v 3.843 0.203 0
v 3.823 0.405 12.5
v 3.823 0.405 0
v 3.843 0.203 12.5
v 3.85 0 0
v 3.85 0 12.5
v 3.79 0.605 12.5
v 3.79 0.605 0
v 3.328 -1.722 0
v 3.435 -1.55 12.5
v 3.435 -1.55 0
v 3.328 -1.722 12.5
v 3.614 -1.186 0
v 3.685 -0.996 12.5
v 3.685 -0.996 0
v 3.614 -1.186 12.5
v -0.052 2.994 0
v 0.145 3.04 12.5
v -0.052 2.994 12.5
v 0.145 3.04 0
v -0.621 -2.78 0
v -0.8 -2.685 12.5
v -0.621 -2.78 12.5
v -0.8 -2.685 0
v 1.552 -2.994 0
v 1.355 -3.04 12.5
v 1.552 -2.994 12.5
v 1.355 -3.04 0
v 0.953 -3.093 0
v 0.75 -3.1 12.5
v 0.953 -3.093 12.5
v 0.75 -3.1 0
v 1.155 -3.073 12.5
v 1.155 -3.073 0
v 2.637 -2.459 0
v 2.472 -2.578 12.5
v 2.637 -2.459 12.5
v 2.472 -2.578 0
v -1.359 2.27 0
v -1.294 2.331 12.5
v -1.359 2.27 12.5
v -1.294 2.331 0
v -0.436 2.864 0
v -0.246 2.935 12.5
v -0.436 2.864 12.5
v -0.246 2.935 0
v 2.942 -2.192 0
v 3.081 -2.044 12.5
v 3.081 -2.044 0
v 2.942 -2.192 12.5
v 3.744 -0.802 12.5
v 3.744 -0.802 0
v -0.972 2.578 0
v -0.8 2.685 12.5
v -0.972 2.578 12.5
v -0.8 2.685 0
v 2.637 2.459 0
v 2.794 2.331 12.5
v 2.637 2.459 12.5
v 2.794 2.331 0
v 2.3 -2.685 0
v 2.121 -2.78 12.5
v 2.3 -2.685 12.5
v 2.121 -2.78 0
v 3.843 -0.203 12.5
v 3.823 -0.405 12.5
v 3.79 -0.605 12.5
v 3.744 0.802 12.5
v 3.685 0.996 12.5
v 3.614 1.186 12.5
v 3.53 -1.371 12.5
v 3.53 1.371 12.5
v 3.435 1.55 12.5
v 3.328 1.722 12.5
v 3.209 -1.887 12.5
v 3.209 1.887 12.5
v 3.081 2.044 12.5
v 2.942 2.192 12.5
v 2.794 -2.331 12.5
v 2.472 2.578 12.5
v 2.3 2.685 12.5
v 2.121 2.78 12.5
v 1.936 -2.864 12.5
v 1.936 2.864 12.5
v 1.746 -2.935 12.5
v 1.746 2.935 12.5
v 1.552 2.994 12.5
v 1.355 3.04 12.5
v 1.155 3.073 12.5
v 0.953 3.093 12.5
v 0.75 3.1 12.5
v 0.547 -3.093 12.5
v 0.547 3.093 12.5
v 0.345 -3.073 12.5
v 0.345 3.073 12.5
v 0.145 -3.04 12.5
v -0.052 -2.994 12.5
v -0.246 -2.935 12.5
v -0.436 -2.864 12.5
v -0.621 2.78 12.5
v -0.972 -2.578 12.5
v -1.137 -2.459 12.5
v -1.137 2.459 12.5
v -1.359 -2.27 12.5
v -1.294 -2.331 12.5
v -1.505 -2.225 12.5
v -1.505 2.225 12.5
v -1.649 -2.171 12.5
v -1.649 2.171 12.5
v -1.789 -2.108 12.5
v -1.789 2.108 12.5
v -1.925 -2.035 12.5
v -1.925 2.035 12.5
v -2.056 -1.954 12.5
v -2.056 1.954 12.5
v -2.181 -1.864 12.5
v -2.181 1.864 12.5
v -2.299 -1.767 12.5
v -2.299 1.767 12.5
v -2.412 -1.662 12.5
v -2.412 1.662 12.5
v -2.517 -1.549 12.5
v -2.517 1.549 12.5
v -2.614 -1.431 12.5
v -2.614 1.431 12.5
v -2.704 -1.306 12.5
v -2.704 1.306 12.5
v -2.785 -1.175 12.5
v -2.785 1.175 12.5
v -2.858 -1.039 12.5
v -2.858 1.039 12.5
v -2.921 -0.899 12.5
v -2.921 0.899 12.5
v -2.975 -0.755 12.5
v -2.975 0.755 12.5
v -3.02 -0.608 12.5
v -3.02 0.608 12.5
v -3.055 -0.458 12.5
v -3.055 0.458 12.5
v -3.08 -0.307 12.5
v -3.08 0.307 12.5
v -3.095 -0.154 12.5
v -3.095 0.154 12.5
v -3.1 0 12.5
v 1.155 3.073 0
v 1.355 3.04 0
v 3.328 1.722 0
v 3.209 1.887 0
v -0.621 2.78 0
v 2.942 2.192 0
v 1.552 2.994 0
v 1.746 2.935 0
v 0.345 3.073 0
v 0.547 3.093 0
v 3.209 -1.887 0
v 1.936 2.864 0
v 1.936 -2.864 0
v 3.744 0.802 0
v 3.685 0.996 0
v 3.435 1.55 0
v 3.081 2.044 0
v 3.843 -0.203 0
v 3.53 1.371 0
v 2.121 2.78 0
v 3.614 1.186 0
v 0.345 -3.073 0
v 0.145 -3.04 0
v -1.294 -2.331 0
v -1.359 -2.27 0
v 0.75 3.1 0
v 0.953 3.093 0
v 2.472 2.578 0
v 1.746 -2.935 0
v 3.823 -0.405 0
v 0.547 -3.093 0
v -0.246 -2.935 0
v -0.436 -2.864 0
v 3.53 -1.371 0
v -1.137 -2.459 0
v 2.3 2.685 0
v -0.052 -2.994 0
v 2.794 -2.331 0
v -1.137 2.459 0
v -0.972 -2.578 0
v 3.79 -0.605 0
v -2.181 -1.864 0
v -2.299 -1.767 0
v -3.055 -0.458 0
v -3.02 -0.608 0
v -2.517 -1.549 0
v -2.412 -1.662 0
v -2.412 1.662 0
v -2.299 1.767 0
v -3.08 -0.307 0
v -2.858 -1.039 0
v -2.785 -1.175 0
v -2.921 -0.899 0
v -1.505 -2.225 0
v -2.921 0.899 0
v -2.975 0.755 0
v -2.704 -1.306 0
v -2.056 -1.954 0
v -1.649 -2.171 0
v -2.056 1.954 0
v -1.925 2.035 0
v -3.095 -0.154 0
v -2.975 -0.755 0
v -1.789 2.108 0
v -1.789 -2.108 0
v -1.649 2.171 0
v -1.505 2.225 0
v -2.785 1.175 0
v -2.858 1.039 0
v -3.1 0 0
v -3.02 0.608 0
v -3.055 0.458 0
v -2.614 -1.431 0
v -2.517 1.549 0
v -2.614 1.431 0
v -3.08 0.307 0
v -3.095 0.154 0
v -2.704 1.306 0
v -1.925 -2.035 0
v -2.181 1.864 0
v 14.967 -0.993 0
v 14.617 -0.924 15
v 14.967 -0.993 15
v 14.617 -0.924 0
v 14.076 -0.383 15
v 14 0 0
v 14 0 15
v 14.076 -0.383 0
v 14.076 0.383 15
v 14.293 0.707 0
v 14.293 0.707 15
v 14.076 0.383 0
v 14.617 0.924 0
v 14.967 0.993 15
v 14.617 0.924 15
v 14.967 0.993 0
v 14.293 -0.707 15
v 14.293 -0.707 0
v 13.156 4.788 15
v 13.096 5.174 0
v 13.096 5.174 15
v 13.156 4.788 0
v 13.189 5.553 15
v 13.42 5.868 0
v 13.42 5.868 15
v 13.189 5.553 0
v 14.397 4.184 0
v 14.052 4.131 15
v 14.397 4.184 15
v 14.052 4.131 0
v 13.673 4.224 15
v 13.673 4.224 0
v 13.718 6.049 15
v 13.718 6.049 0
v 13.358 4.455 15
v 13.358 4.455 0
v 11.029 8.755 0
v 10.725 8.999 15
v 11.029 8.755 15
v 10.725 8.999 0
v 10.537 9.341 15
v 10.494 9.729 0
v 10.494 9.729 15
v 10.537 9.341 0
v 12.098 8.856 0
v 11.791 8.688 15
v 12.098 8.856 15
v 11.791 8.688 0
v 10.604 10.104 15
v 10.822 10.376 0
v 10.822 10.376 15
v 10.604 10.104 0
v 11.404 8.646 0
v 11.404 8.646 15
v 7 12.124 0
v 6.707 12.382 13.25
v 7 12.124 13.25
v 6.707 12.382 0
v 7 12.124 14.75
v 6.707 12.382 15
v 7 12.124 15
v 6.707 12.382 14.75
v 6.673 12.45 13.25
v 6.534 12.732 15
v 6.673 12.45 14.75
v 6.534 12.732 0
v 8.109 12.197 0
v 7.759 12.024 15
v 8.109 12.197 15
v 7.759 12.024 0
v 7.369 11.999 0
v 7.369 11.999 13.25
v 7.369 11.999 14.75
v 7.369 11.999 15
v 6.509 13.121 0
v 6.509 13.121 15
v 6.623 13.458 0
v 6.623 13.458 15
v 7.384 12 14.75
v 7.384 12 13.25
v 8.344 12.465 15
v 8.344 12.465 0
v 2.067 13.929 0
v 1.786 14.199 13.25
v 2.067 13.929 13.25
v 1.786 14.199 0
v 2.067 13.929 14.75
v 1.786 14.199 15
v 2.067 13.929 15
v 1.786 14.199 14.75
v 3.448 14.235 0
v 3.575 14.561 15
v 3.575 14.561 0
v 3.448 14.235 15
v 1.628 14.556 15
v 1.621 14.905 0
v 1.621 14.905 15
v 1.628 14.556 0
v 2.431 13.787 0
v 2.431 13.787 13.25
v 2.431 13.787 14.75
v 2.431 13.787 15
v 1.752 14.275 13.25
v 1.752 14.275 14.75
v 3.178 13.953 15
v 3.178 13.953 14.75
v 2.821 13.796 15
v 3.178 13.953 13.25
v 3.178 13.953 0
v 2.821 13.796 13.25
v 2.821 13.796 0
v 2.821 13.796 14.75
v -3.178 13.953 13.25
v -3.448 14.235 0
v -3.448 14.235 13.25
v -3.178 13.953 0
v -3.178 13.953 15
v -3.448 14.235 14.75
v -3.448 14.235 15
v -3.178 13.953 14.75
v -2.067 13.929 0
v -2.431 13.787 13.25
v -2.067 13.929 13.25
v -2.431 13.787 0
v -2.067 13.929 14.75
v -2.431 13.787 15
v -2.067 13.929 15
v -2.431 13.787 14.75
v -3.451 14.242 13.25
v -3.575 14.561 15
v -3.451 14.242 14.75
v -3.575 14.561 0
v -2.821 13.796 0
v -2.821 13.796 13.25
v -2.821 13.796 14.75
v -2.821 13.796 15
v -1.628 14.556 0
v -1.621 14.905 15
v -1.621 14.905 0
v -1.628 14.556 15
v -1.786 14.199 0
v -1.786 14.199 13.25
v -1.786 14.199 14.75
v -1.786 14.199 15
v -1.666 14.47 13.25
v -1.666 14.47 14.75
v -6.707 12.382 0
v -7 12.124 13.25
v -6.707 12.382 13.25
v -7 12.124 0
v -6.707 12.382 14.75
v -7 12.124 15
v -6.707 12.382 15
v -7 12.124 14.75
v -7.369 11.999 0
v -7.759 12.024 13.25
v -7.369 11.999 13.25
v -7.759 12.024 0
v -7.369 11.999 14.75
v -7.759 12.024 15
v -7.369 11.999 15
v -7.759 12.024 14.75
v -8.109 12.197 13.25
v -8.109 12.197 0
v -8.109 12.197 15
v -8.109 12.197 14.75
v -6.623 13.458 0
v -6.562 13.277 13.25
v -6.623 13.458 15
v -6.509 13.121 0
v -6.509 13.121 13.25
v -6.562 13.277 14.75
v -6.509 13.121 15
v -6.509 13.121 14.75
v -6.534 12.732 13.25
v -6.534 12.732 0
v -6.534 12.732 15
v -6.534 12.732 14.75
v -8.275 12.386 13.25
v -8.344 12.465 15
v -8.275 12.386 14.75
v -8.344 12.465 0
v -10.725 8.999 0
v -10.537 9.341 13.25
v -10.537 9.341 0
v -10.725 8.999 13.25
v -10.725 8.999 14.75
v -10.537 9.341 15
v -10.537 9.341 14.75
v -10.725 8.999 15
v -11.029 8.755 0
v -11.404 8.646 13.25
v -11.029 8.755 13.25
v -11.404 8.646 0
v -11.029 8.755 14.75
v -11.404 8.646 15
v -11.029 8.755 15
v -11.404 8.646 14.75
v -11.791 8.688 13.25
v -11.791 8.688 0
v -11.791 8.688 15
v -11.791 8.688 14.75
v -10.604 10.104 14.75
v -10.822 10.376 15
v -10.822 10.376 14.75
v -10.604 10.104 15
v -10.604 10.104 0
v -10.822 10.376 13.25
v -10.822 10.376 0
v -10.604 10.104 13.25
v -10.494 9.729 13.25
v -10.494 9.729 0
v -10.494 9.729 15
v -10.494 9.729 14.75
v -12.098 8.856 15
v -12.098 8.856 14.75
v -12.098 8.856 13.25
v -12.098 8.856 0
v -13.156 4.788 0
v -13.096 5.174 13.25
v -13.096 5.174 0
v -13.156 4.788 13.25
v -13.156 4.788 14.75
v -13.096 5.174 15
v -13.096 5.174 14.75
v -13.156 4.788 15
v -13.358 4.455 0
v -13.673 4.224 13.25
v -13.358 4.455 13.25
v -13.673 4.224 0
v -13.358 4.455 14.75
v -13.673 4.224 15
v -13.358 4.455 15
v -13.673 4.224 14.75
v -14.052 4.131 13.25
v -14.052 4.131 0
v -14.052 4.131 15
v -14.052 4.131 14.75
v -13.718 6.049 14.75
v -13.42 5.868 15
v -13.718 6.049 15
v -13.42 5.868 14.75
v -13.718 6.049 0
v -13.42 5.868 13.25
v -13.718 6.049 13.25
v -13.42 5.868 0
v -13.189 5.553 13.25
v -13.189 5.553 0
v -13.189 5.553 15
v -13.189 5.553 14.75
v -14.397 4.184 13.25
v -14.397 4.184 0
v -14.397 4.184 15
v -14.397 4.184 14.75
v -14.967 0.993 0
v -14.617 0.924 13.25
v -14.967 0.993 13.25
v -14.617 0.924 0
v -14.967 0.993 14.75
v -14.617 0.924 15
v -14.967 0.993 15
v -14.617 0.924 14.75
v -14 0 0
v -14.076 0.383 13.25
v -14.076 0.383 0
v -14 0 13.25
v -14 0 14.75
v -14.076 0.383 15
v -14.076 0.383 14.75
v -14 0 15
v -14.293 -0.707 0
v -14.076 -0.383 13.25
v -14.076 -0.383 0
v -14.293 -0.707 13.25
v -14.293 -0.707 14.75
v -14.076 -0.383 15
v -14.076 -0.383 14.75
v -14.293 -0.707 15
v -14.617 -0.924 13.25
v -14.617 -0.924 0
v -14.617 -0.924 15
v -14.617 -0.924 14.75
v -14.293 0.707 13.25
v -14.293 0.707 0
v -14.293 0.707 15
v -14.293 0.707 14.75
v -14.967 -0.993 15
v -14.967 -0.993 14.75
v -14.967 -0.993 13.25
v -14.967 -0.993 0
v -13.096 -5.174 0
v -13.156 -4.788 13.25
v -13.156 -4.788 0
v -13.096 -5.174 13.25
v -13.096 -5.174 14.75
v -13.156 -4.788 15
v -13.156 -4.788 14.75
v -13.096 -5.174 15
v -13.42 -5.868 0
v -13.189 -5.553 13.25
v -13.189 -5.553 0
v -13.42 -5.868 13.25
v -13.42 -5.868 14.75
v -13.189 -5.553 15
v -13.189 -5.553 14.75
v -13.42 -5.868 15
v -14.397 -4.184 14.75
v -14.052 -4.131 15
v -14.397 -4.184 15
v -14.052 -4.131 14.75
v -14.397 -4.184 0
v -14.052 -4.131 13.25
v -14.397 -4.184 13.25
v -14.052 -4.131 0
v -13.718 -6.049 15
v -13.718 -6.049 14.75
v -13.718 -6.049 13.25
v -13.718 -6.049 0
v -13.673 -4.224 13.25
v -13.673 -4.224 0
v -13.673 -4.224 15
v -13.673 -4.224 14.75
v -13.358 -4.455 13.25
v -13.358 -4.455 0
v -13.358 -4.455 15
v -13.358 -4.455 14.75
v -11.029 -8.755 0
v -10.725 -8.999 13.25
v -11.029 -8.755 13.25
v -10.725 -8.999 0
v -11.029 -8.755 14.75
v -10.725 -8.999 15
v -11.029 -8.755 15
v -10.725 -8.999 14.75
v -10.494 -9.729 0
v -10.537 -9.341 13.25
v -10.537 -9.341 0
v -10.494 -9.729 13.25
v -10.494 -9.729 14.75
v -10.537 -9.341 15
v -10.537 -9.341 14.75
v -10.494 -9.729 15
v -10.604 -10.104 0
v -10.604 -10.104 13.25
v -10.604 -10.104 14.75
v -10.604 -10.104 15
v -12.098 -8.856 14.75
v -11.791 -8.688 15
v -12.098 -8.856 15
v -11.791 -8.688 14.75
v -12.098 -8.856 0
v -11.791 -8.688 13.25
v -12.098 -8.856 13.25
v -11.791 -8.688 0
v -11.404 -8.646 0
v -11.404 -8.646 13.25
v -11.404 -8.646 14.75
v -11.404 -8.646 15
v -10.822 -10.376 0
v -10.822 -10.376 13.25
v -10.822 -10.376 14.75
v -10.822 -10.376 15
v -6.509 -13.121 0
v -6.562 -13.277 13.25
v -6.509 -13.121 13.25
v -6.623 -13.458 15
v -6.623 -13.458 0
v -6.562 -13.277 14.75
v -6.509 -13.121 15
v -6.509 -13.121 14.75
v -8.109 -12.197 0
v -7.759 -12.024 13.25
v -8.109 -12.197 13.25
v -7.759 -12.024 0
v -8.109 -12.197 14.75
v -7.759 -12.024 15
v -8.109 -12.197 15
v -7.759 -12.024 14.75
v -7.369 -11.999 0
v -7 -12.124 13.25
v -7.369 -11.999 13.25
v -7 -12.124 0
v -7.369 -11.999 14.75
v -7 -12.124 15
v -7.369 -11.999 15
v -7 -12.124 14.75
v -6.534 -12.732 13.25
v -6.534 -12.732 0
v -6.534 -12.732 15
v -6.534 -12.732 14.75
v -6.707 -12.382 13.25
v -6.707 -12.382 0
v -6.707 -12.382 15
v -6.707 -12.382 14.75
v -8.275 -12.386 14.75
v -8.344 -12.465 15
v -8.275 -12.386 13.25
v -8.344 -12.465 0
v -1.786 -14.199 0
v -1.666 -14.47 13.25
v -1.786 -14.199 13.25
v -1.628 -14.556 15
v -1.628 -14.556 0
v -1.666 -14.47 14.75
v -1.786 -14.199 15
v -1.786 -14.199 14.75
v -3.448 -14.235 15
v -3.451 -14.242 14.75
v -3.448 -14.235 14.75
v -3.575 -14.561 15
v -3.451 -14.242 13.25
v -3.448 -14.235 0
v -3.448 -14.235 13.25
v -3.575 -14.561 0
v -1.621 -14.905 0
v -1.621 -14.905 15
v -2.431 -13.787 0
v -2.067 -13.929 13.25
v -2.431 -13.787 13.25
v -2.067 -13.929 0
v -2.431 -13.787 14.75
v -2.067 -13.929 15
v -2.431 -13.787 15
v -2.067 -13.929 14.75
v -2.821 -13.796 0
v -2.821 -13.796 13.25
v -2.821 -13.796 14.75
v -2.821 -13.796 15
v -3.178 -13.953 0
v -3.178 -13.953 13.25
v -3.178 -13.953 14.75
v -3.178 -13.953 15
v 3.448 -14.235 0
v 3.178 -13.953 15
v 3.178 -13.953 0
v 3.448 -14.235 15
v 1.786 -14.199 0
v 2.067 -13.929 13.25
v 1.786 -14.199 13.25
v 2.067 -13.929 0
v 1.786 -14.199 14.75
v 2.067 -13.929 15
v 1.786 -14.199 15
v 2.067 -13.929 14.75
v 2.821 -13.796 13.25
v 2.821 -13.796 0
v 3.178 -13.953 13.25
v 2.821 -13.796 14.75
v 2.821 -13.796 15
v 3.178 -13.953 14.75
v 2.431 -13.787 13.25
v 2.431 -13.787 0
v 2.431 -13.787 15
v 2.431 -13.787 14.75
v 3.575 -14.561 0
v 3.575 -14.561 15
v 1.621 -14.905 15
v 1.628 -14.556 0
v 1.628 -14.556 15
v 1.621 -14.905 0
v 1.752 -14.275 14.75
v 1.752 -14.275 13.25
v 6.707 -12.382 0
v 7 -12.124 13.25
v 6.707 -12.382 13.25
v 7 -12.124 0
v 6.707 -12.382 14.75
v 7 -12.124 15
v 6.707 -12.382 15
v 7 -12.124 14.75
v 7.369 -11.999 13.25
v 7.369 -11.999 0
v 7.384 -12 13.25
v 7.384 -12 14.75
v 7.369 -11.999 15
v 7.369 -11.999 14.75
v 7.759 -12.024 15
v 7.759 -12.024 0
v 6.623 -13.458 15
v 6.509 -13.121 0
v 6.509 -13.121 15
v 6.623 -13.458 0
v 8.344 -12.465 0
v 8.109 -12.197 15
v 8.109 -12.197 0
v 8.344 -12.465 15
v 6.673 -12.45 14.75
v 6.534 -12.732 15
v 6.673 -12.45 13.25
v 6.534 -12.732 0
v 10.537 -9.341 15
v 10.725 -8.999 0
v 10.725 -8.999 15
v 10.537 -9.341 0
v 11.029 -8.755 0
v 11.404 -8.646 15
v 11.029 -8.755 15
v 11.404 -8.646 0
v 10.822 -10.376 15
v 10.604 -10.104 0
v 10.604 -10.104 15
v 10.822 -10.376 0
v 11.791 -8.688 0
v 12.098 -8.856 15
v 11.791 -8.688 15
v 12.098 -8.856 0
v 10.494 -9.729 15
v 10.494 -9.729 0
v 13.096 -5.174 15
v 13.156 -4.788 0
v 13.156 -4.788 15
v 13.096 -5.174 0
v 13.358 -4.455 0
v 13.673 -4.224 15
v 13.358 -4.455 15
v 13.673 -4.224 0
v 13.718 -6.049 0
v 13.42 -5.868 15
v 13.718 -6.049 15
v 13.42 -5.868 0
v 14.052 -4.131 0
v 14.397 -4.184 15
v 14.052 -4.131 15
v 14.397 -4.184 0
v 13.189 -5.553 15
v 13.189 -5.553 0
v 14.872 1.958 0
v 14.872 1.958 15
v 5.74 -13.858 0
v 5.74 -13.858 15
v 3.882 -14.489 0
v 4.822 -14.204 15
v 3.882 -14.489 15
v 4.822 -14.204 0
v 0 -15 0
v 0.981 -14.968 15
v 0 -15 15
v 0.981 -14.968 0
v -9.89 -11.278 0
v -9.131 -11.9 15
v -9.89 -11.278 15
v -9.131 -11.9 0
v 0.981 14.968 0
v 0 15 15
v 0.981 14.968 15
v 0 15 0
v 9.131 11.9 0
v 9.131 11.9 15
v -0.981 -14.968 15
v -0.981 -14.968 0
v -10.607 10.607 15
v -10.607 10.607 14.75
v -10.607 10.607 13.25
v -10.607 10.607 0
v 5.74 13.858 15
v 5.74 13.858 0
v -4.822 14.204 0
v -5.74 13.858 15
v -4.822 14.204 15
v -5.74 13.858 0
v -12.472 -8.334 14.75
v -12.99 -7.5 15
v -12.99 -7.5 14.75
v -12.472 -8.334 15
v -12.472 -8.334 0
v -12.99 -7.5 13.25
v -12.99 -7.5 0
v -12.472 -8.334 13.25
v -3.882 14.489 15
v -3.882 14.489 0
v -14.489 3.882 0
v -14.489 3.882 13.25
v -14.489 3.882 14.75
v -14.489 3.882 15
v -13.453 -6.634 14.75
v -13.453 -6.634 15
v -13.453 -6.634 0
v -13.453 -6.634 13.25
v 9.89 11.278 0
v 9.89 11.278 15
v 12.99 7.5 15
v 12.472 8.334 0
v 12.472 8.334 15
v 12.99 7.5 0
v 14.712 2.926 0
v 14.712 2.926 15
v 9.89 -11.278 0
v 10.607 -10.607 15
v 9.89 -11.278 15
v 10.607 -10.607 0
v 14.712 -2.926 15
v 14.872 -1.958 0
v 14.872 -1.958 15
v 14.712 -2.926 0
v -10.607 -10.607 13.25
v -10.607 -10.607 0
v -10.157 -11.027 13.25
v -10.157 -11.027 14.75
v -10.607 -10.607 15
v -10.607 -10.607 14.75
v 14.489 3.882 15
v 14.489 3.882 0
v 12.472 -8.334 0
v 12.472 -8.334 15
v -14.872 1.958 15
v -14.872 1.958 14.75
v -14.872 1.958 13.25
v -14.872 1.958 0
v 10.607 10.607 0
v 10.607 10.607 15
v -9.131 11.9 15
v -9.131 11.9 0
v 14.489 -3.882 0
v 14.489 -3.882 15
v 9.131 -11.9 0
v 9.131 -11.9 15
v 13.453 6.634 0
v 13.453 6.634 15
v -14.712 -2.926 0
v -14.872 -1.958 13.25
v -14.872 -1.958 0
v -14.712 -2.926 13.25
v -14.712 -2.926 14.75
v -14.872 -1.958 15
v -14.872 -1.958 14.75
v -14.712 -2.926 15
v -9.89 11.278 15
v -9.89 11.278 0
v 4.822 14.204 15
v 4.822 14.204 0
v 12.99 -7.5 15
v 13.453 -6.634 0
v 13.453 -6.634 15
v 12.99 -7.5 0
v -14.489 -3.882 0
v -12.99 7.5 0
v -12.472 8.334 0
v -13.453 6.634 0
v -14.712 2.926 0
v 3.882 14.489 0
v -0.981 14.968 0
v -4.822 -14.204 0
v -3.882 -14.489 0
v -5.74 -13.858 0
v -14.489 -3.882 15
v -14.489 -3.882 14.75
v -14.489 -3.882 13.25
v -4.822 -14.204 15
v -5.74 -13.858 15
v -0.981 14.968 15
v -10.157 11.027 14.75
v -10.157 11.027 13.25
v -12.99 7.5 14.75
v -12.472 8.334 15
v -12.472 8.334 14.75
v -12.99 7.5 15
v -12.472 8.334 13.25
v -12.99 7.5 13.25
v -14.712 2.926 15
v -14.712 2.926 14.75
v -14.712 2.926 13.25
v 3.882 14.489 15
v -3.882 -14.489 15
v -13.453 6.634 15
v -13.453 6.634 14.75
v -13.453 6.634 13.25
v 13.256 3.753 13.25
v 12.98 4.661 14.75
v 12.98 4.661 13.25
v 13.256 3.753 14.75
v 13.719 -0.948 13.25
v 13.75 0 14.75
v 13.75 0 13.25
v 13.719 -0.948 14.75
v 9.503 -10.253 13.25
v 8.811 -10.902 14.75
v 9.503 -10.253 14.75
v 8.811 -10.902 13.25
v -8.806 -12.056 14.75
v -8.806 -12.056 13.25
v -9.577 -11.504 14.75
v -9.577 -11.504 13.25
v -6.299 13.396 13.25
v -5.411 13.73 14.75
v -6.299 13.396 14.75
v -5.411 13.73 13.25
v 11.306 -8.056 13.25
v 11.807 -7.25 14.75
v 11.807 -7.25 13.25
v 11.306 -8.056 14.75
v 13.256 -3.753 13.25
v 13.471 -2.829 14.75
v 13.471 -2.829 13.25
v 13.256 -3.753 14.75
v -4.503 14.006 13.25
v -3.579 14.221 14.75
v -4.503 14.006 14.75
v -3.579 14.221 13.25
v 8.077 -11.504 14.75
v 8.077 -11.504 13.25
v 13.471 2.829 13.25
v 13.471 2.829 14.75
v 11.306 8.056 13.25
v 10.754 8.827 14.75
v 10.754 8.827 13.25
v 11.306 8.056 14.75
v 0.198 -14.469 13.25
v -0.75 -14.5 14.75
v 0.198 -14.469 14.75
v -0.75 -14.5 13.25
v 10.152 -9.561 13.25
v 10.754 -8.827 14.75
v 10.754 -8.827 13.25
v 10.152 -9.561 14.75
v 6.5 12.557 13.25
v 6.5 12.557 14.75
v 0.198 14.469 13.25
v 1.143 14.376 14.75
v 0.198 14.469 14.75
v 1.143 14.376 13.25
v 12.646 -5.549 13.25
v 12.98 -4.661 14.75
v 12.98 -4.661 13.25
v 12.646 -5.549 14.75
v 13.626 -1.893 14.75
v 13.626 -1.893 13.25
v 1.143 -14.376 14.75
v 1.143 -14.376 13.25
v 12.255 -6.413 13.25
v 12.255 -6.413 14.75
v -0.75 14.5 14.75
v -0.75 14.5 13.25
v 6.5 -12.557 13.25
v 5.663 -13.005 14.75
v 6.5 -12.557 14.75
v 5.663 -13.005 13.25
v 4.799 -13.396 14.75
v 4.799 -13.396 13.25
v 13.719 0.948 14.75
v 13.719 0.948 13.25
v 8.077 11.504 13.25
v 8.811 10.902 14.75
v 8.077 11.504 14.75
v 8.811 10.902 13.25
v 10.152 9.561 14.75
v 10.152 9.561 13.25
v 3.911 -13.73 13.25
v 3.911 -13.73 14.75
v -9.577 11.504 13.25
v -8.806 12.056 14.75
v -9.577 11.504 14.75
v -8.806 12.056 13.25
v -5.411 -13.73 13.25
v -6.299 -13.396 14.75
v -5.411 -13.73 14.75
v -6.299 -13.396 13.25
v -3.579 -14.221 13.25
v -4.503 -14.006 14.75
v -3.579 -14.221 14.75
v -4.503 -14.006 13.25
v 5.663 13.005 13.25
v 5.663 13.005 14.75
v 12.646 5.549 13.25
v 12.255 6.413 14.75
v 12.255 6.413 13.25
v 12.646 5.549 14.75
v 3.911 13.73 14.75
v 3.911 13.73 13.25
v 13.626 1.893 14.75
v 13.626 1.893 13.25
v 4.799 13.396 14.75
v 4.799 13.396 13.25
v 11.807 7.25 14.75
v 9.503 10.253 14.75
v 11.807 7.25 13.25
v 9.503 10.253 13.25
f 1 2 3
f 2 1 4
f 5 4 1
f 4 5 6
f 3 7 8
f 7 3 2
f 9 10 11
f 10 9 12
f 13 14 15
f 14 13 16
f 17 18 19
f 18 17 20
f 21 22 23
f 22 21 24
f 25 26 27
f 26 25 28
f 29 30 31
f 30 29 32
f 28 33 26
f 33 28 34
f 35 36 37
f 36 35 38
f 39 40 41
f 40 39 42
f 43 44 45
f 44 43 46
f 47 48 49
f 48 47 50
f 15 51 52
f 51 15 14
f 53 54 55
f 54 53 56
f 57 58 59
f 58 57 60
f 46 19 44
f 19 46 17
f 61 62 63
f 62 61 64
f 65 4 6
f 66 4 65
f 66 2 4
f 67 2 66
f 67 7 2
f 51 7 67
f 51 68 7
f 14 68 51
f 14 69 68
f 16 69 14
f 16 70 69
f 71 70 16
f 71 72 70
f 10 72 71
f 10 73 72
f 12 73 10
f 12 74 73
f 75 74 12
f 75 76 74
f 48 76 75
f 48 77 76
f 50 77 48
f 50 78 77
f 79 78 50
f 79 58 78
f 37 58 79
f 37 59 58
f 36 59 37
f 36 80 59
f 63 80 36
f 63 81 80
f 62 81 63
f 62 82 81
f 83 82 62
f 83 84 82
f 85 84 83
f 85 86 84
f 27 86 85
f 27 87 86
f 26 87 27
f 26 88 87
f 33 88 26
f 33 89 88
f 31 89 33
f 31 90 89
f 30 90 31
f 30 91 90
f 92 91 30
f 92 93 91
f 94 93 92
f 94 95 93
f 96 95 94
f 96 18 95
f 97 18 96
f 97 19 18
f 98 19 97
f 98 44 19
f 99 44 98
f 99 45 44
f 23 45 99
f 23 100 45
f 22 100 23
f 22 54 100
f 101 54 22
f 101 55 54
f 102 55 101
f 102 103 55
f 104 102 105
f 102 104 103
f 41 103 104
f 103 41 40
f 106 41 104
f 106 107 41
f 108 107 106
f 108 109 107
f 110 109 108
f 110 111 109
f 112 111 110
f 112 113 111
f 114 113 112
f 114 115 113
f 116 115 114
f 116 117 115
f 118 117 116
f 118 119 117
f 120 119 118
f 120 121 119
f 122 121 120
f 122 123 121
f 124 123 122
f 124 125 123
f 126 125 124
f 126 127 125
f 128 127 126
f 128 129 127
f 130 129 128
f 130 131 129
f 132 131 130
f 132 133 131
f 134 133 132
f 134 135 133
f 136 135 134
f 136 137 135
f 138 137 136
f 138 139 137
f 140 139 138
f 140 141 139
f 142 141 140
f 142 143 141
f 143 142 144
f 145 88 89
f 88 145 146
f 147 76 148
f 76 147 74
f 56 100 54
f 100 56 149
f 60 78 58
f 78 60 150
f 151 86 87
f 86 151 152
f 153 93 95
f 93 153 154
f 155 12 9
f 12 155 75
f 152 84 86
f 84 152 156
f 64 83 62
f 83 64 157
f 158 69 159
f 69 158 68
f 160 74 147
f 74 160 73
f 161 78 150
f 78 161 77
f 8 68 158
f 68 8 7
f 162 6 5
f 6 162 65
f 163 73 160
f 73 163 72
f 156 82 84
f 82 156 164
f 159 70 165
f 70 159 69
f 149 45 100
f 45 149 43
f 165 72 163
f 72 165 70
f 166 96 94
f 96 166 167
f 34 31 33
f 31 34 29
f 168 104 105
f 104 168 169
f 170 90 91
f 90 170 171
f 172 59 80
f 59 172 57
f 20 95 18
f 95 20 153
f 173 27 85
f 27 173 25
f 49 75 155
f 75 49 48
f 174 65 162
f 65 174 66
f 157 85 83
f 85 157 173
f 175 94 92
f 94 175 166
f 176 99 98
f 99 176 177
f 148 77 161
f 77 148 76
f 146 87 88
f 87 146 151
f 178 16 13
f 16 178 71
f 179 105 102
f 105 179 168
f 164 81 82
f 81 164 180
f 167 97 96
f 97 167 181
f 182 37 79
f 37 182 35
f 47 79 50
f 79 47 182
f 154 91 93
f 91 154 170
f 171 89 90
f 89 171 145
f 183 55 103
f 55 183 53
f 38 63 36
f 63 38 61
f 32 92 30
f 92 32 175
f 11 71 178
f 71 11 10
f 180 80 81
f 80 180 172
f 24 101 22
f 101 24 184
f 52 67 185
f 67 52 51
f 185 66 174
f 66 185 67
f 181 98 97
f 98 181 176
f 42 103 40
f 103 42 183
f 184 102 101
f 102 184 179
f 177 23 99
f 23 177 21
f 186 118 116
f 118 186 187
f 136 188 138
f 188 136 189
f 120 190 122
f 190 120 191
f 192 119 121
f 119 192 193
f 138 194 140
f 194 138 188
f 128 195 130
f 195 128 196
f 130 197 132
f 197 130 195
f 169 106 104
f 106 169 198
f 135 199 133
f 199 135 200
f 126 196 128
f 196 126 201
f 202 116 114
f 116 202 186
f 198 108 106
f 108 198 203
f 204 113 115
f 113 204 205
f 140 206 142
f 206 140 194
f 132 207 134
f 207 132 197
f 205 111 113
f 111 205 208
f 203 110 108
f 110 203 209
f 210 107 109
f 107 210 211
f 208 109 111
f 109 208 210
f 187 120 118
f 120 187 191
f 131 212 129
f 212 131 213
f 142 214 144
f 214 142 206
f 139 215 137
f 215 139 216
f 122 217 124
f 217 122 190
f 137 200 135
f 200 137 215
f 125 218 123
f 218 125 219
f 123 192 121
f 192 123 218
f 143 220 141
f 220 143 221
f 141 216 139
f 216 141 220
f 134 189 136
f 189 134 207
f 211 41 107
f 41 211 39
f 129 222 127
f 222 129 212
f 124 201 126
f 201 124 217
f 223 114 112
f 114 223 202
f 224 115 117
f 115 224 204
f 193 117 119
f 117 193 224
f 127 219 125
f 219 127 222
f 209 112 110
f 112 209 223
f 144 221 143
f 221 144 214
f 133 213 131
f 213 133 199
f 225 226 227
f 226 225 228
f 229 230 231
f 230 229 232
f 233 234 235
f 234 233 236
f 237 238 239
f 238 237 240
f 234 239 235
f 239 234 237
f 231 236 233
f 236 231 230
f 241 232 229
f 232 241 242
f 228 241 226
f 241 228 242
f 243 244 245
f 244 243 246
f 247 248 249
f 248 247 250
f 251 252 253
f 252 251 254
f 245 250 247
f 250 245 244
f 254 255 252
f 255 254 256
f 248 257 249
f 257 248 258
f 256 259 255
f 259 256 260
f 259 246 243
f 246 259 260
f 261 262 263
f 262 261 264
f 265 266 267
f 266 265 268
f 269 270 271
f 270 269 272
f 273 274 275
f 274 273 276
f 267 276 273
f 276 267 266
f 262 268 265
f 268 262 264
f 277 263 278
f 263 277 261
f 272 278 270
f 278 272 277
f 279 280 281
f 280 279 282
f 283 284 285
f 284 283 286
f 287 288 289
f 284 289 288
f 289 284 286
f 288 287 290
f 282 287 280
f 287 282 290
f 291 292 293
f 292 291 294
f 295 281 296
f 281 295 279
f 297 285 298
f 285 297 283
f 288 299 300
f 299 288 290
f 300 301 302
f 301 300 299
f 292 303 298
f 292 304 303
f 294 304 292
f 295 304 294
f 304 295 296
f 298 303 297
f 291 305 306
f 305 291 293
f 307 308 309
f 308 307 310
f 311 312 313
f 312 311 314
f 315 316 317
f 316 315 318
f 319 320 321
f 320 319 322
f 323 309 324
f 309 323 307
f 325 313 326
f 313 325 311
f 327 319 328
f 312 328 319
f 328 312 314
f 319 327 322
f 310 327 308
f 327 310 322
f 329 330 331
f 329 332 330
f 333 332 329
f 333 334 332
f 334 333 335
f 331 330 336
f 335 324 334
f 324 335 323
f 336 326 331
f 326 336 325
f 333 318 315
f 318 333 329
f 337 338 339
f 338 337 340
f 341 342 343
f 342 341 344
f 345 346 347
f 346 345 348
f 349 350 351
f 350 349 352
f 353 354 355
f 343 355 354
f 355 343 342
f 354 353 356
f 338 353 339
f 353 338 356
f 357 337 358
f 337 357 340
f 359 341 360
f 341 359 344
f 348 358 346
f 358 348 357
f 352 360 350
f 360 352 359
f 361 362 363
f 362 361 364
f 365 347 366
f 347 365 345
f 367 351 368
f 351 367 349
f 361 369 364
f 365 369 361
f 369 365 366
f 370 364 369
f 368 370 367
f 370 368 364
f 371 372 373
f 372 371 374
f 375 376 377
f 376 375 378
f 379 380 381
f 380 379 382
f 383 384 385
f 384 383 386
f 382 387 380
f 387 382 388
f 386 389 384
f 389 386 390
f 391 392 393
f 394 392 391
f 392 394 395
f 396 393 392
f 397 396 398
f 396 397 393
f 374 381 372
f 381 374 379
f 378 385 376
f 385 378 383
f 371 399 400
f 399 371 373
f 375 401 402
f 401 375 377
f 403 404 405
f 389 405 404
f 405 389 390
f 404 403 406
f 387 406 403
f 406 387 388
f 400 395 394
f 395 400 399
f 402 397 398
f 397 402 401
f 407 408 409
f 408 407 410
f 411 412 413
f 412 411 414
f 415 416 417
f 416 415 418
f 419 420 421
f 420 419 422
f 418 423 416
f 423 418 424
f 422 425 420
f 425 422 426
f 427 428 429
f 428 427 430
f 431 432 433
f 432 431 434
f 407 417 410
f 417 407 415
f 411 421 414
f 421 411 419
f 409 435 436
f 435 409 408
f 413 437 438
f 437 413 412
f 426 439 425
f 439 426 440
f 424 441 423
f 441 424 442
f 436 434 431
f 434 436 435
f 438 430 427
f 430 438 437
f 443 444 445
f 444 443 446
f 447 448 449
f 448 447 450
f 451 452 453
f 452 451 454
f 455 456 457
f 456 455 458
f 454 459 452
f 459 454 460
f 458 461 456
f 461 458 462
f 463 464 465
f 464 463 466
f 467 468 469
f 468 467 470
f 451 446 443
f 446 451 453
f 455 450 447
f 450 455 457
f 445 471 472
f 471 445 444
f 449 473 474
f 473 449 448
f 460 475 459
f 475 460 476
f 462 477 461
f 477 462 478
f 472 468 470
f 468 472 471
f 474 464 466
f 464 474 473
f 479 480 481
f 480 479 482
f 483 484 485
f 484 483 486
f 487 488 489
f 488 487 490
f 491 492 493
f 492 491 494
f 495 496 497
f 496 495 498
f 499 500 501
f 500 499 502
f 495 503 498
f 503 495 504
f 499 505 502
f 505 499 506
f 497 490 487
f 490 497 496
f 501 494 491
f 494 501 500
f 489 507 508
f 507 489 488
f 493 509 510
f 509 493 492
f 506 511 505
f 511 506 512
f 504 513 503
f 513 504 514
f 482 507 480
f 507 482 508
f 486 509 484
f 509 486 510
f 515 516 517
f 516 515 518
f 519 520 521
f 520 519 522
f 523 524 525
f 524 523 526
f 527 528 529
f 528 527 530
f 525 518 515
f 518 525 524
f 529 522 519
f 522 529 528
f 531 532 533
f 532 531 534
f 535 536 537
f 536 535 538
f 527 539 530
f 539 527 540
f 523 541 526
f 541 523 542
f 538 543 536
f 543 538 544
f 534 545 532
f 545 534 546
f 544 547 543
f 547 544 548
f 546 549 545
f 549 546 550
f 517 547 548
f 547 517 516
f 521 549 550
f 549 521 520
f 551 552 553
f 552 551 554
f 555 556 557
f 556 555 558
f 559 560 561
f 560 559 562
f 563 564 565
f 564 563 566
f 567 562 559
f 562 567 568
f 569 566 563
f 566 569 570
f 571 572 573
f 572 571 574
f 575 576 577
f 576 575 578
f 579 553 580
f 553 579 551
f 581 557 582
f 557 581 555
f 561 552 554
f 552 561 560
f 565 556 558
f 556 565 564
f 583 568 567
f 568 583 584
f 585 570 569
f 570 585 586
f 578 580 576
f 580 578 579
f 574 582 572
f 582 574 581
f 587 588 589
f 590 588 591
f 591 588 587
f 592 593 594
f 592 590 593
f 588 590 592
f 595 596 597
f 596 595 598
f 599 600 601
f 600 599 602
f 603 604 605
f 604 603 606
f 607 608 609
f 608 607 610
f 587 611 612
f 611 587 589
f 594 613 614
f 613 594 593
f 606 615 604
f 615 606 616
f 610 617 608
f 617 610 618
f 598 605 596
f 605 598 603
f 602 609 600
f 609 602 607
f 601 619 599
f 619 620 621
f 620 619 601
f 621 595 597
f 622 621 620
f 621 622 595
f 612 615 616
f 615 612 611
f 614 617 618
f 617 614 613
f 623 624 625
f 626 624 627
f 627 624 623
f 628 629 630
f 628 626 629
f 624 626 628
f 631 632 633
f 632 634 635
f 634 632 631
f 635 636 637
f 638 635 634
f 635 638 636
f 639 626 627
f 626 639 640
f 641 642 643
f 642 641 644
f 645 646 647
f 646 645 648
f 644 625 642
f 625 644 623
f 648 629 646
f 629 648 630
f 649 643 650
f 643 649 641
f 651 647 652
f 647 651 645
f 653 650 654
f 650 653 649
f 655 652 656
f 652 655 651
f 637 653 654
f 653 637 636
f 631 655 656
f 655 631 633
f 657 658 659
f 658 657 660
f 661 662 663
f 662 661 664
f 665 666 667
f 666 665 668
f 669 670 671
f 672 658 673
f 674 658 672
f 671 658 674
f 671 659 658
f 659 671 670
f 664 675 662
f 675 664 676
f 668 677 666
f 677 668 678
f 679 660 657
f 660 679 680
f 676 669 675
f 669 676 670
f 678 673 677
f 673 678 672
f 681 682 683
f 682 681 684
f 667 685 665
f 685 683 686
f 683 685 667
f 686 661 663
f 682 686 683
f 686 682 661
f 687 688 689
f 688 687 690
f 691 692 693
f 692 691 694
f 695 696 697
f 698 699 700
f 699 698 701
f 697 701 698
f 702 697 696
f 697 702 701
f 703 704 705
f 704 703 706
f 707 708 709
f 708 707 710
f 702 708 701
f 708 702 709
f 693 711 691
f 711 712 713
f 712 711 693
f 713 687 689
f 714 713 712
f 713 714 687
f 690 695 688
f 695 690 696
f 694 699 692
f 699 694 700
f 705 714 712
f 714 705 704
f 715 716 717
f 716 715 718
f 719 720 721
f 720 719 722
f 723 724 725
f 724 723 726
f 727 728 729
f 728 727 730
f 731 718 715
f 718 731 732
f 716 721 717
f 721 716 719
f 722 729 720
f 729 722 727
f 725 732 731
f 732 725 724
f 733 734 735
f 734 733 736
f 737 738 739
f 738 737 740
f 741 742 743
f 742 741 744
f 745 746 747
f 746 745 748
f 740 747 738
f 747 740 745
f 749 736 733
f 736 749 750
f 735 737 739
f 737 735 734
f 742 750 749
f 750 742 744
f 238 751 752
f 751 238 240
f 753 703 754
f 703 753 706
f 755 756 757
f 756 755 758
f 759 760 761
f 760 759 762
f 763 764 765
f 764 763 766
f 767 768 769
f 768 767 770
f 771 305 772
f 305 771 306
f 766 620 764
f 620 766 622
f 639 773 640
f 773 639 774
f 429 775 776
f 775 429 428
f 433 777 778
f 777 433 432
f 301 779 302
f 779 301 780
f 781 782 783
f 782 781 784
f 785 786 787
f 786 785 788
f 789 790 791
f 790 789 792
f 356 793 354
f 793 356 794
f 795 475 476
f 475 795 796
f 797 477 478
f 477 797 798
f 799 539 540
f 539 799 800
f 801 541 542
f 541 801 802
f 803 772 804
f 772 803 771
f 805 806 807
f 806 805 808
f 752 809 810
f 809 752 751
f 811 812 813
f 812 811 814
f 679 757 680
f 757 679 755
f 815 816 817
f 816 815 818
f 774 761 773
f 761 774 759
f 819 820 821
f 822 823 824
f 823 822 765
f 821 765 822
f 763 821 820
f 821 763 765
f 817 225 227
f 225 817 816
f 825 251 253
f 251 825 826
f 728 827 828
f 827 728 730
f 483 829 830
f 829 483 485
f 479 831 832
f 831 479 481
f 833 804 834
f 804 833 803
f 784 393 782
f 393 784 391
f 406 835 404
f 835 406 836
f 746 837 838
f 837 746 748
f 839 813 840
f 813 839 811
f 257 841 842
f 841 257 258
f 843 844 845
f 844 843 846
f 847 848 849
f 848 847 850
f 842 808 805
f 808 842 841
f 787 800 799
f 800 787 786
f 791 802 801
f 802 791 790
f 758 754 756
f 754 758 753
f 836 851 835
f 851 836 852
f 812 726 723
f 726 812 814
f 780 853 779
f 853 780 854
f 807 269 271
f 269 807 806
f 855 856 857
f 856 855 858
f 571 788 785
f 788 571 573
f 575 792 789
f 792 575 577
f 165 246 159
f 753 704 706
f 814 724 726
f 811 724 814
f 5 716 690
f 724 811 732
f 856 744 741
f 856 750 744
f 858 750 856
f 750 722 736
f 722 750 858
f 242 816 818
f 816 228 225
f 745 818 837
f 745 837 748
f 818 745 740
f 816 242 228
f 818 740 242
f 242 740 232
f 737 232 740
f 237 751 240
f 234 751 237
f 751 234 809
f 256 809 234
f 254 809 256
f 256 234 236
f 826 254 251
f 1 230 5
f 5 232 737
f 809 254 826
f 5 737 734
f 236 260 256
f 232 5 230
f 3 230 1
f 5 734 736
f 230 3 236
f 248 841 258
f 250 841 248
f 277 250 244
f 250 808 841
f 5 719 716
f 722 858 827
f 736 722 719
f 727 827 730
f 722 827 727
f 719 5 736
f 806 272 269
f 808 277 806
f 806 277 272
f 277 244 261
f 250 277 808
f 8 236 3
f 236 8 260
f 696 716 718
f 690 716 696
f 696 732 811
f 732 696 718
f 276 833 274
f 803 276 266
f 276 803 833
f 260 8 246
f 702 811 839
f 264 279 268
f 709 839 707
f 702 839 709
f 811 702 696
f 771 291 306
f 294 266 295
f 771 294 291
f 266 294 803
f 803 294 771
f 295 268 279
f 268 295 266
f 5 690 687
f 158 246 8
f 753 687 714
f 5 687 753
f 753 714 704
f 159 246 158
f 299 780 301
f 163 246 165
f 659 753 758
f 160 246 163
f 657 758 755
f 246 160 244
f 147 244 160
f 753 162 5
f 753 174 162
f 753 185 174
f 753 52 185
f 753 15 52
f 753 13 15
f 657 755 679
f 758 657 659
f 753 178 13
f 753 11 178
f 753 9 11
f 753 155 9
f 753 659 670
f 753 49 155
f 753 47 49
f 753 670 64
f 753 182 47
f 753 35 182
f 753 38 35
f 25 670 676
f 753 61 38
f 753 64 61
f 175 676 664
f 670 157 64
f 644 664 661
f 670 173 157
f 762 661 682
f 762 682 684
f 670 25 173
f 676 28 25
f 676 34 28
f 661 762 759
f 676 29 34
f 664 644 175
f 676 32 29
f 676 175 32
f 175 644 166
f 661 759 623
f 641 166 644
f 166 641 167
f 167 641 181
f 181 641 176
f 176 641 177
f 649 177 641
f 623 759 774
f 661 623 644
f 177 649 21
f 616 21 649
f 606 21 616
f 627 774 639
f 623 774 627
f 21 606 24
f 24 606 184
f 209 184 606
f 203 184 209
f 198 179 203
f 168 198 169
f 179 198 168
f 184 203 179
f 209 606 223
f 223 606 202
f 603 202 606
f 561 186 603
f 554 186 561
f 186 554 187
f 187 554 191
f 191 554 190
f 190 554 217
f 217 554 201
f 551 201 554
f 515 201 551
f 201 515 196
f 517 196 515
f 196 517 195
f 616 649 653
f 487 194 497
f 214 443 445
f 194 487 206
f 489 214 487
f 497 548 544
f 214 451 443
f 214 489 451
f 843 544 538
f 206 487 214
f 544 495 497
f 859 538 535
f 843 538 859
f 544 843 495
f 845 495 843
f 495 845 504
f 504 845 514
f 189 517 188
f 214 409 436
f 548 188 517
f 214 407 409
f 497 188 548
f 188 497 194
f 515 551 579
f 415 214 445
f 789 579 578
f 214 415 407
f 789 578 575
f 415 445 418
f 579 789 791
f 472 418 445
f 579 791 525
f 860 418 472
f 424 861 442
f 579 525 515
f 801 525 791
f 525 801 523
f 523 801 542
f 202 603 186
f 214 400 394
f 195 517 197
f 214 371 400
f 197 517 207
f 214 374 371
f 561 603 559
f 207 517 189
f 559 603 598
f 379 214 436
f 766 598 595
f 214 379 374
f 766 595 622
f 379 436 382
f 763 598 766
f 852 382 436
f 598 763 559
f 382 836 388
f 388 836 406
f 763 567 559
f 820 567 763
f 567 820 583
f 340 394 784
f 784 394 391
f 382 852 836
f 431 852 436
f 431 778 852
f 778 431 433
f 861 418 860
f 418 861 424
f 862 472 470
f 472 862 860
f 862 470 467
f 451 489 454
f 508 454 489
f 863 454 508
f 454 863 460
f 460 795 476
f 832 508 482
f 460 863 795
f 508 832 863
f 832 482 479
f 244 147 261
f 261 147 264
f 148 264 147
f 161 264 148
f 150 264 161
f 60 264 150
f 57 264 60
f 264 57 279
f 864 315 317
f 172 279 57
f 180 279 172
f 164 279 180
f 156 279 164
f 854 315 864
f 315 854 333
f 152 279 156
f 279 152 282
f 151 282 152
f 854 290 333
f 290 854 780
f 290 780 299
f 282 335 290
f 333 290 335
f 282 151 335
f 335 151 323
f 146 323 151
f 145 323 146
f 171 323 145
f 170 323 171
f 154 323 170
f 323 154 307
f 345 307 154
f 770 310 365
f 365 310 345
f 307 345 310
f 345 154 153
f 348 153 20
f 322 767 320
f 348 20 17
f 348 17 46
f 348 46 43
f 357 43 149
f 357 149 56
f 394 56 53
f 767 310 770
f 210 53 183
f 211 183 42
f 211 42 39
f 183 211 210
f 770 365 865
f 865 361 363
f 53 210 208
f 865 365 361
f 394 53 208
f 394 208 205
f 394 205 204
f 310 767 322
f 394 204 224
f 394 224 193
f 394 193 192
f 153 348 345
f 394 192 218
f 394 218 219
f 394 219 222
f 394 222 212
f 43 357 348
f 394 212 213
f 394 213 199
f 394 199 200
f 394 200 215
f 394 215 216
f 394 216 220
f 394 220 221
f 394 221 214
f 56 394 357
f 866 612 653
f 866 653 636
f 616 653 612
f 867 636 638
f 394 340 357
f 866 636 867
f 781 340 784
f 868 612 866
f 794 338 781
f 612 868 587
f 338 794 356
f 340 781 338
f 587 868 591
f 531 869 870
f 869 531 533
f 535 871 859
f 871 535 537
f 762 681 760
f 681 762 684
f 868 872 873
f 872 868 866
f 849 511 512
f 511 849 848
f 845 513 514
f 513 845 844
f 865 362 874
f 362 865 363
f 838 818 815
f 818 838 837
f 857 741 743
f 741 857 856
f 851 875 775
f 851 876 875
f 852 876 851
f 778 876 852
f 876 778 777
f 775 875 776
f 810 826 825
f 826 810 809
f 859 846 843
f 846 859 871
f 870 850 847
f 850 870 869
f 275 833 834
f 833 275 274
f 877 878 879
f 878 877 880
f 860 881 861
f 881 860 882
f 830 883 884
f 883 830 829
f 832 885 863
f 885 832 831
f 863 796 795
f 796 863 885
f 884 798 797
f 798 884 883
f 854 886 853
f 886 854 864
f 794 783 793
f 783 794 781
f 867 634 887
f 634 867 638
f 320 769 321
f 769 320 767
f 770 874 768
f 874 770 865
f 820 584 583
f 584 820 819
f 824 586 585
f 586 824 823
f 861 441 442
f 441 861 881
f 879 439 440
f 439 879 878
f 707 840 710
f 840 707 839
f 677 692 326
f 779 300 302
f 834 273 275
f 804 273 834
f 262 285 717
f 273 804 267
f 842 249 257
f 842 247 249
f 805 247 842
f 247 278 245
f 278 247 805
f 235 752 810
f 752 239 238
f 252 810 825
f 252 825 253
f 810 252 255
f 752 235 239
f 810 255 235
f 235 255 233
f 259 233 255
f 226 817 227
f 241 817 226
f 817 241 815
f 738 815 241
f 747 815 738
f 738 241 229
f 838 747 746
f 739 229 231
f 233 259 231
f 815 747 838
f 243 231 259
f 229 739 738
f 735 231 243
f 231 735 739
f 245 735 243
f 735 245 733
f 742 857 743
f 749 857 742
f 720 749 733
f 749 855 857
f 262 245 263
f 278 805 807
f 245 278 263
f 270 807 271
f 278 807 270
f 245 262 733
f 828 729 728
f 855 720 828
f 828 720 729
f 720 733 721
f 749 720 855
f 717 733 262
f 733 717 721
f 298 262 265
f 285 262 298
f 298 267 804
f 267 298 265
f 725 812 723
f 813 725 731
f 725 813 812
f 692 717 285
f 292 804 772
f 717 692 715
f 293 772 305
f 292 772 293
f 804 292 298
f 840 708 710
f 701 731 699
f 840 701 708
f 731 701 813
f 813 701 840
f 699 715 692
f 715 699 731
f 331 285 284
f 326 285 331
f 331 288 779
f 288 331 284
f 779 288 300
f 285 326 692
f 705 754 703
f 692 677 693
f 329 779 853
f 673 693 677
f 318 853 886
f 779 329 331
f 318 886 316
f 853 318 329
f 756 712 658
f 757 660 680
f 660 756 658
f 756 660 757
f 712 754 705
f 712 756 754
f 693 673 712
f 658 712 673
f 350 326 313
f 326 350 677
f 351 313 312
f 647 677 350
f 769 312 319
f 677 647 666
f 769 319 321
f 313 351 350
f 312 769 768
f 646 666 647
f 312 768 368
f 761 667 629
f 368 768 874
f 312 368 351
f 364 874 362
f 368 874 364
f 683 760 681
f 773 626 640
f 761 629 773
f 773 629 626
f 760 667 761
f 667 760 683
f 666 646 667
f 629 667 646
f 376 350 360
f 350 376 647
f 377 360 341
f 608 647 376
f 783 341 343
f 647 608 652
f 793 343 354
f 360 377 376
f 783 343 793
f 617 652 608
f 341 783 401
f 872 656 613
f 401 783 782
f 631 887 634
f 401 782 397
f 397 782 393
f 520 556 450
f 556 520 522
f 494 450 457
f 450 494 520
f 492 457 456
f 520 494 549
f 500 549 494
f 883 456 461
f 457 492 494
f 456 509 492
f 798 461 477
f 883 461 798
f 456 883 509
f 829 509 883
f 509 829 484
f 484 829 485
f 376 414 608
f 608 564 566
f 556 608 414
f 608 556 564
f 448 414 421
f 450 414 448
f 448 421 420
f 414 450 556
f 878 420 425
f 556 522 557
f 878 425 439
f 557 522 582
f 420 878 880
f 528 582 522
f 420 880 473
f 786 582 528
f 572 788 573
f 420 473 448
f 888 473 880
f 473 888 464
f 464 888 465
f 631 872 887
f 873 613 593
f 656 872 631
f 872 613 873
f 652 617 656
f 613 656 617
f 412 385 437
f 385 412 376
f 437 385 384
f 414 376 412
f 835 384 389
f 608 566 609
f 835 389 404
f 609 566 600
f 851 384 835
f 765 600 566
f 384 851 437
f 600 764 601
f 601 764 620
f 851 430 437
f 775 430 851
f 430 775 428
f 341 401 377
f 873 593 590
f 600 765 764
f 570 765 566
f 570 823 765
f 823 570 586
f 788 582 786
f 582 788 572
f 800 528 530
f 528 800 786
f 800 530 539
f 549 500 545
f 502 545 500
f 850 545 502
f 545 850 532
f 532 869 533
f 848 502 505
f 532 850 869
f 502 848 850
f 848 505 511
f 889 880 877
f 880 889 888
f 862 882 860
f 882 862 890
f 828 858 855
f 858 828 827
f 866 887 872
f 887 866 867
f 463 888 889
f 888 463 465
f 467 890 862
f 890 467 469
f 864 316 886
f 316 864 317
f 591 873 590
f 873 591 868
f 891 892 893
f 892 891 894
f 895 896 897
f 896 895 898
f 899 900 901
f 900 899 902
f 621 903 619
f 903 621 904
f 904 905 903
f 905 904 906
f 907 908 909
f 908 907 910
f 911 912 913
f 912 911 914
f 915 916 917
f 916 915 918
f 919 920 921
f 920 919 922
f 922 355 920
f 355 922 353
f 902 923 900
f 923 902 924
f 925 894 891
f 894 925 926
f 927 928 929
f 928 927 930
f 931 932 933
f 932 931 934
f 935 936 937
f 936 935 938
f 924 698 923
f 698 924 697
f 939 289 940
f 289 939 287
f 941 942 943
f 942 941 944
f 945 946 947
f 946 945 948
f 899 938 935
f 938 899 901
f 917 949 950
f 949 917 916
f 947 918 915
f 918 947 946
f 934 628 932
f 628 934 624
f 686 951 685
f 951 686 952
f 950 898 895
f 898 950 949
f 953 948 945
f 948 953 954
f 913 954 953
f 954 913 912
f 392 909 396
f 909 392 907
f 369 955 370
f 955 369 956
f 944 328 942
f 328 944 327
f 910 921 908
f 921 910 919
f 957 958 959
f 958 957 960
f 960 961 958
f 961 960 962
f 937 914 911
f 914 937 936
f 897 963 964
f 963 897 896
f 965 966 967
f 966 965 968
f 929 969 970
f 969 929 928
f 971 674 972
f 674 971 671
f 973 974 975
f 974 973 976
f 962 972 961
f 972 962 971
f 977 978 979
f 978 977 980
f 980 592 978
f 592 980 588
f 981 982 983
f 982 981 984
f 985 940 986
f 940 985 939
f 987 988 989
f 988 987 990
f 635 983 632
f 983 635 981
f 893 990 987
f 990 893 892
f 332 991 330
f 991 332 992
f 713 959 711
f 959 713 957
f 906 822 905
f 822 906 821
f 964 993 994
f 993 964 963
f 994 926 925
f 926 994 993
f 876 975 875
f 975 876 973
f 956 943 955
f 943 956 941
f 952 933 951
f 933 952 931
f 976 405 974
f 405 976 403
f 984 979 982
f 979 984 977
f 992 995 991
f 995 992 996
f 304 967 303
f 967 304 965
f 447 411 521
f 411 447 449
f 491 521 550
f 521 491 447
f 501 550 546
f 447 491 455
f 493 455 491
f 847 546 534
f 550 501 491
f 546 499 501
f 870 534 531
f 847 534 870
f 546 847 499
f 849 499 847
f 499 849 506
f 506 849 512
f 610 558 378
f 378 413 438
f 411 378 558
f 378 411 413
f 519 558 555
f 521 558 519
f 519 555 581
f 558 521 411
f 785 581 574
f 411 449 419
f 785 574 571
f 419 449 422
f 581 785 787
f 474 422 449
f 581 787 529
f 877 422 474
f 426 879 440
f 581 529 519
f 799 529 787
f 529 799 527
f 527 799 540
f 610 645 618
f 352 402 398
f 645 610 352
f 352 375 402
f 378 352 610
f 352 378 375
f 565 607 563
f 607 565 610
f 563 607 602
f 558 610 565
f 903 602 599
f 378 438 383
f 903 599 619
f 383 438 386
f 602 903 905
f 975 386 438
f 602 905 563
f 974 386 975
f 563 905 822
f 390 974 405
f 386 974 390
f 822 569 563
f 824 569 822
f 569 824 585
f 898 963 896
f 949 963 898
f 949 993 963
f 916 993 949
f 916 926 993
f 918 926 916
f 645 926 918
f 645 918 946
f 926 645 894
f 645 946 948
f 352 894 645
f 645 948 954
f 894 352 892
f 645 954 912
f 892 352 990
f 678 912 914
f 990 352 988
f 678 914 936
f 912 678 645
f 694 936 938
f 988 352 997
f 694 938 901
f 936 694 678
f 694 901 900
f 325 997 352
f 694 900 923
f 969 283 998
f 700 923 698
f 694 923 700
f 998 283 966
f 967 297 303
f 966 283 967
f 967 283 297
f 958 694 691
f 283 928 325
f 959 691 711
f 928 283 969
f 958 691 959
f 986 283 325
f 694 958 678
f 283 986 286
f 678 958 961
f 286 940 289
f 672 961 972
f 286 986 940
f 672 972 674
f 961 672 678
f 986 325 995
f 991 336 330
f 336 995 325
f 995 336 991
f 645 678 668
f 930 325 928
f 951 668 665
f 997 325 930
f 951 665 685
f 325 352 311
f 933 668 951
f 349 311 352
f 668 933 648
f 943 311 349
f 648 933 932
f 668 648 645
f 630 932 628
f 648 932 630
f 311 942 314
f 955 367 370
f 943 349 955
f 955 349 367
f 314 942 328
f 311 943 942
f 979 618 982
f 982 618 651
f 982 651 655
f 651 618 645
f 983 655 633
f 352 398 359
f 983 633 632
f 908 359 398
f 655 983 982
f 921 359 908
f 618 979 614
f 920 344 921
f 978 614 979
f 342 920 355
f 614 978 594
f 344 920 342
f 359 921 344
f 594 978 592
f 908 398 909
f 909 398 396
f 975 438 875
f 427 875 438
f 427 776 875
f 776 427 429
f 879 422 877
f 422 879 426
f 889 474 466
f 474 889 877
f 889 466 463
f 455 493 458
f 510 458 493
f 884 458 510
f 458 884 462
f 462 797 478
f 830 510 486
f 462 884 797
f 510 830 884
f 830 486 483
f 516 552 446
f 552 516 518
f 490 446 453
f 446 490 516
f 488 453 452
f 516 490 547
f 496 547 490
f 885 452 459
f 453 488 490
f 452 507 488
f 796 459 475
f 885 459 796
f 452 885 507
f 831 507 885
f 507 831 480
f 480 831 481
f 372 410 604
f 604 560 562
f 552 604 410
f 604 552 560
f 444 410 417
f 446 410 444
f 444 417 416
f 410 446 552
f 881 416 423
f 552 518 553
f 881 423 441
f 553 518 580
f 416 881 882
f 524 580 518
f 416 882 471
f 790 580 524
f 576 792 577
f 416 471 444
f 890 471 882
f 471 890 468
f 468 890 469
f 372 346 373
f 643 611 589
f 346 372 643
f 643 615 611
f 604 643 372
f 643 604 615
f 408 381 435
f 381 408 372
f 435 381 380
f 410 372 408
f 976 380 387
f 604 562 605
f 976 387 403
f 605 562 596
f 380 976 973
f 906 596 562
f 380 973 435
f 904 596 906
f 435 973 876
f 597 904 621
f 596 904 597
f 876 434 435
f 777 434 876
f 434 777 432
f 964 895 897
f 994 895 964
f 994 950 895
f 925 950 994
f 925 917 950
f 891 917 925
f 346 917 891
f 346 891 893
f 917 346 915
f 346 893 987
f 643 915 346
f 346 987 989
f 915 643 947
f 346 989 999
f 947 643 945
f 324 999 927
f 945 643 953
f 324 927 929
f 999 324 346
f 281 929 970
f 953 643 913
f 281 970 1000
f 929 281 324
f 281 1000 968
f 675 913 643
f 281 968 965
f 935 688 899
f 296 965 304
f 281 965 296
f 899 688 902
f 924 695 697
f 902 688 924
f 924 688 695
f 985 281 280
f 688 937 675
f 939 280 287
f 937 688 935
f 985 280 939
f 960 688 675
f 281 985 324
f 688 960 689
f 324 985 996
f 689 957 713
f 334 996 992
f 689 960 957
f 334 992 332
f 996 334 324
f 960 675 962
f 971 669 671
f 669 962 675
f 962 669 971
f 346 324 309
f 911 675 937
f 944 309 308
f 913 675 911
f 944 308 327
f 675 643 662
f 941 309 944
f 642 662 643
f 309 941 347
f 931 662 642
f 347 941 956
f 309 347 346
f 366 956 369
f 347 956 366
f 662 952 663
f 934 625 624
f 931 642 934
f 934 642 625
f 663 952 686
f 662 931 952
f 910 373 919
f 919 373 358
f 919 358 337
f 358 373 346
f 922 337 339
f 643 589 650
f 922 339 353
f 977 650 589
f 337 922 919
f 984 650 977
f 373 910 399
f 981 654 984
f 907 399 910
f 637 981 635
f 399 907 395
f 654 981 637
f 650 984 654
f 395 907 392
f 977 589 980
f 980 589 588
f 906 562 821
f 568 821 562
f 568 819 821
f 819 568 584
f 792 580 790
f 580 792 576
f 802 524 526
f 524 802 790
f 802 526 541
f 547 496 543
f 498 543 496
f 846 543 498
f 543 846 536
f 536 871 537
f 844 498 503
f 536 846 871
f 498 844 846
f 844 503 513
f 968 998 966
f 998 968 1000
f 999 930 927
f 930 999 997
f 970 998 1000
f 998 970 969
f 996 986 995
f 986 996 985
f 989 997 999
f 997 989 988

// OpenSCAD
// Replacement knob for hotplate stirrer (D-shaft 6 mm)
// Print orientation: flat bottom face on bed (z = 0), builds upward.

$fn = 96;

// ---- Dimensions (mm) ----
knob_d        = 30;    // knob outer diameter
knob_h        = 15;    // knob height
bore_depth    = 12;    // D-bore depth from bottom face
bore_w        = 4.7;   // D-bore width (flat to opposite side)
bore_d        = 6.2;   // D-bore circle diameter
groove_count  = 18;    // number of grip grooves
groove_d      = 2;     // grip groove diameter
pointer_w     = 1.5;   // pointer groove width
pointer_d     = 1;     // pointer groove depth

eps           = 0.5;   // overcut for clean differences

// ---- Derived ----
bore_r = bore_d / 2;
flat_x = (bore_d - bore_w) / 2;   // offset of flat from circle centre

difference() {
    // Main body
    cylinder(d = knob_d, h = knob_h);

    // D-shaped blind bore from bottom face
    translate([0, 0, -eps])
        union() {
            translate([flat_x, 0, 0])
                cylinder(r = bore_r, h = bore_depth + 2 * eps);
            translate([-flat_x, 0, 0])
                cylinder(r = bore_w / 2, h = bore_depth + 2 * eps);
        }

    // Vertical grip grooves along full height
    for (i = [0 : groove_count - 1])
        rotate([0, 0, i * 360 / groove_count])
            translate([knob_d / 2, 0, -eps])
                cylinder(d = groove_d, h = knob_h + 2 * eps, $fn = 16);

    // Pointer groove on top face, same side as D-flat
    translate([-flat_x, 0, knob_h - pointer_d])
        linear_extrude(height = pointer_w, center = true)
            circle(r = knob_d / 2 - 0.5);
}
